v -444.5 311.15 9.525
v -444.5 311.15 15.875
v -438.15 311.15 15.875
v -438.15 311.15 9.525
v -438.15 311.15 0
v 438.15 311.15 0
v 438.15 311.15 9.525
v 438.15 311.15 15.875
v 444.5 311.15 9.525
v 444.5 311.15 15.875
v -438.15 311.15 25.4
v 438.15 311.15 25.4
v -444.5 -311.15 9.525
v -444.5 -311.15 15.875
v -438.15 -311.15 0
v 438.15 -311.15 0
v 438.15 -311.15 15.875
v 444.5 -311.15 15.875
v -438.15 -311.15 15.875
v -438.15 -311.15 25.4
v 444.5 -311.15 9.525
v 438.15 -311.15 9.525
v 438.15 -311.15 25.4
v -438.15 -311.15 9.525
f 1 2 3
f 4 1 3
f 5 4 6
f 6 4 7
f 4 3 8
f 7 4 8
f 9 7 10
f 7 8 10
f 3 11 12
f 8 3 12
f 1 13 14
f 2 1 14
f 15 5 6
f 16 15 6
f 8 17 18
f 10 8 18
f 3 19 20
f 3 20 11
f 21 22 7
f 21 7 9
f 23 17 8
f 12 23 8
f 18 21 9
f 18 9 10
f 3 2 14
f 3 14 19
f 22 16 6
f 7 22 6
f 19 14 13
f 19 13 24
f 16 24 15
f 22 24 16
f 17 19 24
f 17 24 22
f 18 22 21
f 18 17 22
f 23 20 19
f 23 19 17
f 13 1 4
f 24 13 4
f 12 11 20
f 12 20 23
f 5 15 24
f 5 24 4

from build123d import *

# Parameters (mm, degrees)
F0_W     = 876.3
F0_H     = 622.3
F1_DEPTH = 25.4
F2_W     = 12.7
F2_H     = 6.35
F3_DEPTH = 622.3


with BuildPart() as f1:
    # F0 (on Top) → F1 (new body)
    with BuildSketch(Plane.XY):
        Rectangle(F0_W, F0_H)
    extrude(amount=F1_DEPTH)

    # F2 (on face) → F3 (join)
    with BuildSketch(Plane.XZ.offset(311.15)):
        with Locations((-438.15, 12.7)):
            Rectangle(F2_W, F2_H)
        with Locations((438.15, 12.7)):
            Rectangle(F2_W, F2_H)
    extrude(amount=-F3_DEPTH)


solid = f1.part
